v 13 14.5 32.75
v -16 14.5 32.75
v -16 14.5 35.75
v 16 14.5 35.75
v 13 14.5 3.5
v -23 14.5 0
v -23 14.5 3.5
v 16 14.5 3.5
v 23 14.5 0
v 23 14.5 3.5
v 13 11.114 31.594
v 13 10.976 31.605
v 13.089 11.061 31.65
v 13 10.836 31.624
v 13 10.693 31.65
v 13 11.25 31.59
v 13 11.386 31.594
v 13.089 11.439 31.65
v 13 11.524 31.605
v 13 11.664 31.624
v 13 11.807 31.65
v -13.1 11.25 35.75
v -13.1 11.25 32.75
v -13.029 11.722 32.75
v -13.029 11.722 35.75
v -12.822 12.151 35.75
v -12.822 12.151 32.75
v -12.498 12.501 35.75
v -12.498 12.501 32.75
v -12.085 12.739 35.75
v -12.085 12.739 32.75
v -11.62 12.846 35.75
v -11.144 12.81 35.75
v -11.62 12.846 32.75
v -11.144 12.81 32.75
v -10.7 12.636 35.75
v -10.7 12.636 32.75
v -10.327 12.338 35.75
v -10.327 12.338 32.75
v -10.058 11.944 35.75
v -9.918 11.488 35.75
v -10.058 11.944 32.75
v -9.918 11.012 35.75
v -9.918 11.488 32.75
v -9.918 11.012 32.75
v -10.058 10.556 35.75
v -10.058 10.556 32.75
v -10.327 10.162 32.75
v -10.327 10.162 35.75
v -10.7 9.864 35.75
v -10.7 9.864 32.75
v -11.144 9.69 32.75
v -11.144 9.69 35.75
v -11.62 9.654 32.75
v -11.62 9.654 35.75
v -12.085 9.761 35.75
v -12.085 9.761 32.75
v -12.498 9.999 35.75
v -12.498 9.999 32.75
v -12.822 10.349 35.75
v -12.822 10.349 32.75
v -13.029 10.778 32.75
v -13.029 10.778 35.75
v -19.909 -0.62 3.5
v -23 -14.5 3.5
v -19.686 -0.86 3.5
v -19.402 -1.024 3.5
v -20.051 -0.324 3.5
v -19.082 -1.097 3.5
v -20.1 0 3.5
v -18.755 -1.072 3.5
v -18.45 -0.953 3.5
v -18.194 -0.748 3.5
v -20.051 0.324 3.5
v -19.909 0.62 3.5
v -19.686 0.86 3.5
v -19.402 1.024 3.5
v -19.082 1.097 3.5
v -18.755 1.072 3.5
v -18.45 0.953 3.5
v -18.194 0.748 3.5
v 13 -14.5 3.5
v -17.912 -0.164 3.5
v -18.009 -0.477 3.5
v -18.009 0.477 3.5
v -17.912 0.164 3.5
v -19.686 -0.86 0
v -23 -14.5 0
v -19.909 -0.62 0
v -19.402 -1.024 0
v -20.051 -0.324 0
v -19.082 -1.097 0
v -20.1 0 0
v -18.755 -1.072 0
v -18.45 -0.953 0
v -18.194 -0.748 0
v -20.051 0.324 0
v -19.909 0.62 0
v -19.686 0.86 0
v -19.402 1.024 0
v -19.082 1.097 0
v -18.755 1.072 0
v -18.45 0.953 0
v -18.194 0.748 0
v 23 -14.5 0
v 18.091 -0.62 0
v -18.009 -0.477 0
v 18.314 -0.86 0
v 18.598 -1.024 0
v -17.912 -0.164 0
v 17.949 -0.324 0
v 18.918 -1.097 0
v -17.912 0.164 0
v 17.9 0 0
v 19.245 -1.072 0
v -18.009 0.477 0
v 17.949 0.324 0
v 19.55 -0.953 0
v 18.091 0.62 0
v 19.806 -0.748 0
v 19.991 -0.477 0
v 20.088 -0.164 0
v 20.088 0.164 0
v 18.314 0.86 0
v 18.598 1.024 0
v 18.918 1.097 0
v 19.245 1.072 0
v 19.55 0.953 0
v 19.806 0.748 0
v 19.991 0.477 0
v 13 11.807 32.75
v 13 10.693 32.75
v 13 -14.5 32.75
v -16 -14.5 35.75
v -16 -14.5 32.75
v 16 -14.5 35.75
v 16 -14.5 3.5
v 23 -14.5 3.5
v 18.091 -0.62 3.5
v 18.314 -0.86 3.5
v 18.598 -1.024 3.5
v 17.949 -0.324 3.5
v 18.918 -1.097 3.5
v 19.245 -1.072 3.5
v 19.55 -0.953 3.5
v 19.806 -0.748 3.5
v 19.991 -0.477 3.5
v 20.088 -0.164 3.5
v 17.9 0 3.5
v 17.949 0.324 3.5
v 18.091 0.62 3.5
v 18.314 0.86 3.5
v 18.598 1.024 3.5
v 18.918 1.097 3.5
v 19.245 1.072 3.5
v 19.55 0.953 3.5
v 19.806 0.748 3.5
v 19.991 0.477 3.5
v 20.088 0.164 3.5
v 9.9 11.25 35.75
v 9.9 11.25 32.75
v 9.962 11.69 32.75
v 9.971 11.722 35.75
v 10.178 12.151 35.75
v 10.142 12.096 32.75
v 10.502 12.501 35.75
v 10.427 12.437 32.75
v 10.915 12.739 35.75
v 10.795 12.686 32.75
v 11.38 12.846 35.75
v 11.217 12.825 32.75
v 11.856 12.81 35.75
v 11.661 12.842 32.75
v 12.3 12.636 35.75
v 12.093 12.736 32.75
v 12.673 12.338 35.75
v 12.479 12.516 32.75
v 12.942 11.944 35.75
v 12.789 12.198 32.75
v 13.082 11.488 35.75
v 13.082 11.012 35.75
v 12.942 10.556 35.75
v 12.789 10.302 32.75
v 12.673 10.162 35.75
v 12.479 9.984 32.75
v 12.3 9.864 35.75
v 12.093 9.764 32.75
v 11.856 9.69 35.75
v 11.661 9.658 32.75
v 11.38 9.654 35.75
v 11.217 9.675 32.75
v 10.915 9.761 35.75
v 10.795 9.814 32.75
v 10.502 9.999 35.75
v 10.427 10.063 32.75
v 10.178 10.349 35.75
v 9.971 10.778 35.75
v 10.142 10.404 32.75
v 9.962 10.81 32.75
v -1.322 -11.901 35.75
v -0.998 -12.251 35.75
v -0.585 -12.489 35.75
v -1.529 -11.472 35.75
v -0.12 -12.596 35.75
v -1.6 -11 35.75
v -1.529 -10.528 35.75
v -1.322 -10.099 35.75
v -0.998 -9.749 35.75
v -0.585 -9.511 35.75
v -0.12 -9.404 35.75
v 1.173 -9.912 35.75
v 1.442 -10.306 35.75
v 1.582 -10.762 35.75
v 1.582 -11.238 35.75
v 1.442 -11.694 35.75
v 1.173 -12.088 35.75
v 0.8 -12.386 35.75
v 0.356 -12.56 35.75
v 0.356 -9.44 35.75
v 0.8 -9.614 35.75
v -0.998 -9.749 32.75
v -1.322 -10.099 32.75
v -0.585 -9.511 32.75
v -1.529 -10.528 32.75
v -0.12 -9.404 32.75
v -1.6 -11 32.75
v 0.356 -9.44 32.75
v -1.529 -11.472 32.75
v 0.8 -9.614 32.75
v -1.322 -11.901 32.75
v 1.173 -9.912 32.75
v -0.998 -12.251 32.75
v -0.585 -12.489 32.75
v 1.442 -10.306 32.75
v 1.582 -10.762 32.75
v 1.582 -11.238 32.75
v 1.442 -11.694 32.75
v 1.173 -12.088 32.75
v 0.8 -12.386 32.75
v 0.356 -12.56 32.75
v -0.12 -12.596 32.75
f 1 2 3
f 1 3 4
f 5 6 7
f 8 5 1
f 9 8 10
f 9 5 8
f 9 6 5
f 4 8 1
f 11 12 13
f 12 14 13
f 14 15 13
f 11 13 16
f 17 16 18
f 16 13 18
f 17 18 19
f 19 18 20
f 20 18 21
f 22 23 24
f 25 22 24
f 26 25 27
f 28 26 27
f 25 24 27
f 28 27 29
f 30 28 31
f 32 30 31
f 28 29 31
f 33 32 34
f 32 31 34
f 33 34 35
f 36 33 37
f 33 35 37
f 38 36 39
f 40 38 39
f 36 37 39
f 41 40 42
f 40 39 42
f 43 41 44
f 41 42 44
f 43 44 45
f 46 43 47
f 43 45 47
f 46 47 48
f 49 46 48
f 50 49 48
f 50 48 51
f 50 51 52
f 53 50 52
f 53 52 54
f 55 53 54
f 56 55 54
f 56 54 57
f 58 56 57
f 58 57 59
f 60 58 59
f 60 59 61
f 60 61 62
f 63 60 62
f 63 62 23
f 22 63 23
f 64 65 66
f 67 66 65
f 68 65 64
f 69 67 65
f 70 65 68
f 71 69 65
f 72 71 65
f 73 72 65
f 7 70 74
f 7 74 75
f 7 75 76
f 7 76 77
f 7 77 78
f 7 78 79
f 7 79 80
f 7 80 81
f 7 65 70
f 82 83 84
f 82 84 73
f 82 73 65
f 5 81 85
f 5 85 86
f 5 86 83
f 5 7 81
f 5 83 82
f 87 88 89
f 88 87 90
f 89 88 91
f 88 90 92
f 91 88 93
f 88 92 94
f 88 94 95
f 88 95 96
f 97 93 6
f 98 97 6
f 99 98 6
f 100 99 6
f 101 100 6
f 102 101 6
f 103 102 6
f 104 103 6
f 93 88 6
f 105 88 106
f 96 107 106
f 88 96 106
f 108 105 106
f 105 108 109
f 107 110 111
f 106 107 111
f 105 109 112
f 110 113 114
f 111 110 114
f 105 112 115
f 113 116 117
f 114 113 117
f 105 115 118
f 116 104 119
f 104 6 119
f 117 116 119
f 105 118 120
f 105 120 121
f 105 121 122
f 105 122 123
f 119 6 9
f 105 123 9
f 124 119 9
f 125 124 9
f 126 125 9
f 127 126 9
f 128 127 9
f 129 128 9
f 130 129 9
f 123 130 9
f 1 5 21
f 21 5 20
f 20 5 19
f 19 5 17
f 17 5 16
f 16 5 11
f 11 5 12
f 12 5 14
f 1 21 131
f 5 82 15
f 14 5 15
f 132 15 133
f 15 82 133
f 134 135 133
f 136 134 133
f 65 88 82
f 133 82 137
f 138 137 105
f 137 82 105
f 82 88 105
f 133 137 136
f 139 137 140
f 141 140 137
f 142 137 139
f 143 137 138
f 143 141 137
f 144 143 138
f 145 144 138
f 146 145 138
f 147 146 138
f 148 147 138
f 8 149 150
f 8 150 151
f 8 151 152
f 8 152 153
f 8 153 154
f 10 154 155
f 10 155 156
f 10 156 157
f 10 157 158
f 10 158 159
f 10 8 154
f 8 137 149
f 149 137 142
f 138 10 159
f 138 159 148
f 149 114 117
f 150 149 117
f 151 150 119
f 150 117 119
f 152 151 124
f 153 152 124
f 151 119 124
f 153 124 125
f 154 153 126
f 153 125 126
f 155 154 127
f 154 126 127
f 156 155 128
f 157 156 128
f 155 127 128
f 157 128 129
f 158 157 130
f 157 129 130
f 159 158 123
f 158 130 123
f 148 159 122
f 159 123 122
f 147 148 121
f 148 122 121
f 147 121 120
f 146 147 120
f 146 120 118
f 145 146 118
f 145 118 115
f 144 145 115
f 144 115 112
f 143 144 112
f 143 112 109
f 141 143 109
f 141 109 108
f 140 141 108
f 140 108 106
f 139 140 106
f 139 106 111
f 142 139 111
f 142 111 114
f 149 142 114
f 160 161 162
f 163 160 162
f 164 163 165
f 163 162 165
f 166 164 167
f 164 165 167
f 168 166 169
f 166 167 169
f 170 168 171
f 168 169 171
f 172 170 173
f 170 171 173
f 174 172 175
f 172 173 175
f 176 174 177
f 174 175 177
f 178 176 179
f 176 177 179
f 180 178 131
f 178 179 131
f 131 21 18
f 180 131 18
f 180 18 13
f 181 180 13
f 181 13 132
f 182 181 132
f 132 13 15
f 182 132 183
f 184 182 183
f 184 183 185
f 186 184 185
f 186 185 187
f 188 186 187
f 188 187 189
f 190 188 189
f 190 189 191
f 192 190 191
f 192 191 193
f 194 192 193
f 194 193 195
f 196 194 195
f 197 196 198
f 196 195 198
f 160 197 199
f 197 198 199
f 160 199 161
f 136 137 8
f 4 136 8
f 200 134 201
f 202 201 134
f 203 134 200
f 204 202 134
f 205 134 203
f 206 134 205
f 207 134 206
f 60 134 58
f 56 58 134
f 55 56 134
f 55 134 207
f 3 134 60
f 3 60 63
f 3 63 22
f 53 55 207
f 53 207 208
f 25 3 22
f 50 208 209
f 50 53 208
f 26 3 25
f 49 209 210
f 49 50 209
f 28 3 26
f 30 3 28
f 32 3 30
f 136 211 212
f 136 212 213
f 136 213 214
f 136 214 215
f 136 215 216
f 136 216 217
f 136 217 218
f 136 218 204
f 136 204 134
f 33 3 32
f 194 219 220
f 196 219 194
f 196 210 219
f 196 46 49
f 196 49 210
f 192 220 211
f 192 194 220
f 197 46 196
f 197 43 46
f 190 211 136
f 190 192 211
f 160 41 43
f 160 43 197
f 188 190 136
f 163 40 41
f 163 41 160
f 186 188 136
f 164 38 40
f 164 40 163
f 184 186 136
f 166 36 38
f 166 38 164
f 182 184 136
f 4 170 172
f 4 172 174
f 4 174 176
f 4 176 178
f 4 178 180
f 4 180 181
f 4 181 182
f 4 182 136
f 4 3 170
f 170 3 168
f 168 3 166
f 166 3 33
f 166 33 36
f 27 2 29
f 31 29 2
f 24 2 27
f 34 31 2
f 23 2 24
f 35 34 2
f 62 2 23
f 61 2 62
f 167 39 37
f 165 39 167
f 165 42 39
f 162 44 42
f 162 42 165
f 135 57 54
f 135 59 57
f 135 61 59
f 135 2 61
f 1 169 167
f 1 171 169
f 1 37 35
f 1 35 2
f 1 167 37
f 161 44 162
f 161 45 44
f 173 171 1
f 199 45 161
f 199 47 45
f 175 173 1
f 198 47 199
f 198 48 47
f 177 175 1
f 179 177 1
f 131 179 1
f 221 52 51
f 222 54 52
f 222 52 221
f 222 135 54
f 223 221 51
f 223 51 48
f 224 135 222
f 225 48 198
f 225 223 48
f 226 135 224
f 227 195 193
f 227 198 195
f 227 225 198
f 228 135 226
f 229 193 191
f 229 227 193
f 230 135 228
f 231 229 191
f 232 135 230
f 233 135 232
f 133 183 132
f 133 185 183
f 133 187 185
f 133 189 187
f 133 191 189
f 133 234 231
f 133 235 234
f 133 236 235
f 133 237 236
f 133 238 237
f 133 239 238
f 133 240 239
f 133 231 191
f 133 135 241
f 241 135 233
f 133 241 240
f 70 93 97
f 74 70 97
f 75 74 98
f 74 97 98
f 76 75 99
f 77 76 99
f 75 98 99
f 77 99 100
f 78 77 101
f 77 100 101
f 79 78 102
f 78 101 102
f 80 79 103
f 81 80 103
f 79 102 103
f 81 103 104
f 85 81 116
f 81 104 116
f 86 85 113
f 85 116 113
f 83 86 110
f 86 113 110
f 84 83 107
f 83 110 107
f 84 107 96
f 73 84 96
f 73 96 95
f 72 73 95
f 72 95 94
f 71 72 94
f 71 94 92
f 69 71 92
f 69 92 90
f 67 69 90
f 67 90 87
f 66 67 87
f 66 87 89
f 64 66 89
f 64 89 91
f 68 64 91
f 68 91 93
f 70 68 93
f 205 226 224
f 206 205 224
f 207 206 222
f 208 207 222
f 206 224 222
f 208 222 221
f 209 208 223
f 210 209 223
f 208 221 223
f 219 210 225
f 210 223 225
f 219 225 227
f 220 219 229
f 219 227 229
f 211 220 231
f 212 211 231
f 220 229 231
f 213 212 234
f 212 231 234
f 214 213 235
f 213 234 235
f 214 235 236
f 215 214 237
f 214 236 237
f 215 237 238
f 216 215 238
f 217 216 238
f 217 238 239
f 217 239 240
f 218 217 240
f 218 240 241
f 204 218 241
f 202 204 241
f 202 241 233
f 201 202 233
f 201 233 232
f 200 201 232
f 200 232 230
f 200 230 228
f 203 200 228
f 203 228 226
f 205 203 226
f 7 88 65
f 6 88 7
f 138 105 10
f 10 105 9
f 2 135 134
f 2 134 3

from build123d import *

# Parameters (mm, degrees)
F0_W     = 46
F0_H     = 29
F1_DEPTH = 3.5
F2_W     = 32
F2_H     = 29
F3_DEPTH = 32.25
F4_W     = 29
F4_H     = 29.25
F5_DEPTH = 29
F7_D     = 3.2
F7_DEPTH = 4.1
F7_TIP   = 0.9613769904
F9_D     = 2.2


with BuildPart() as f1:
    # F0 (on Top) → F1 (new body)
    with BuildSketch(Plane.XY):
        Rectangle(F0_W, F0_H)
    extrude(amount=F1_DEPTH)

    # F2 (on face) → F3 (join)
    with BuildSketch(Plane.XY.offset(3.5)):
        Rectangle(F2_W, F2_H)
    extrude(amount=F3_DEPTH)

    # F4 (on face) → F5 (cut)
    with BuildSketch(Plane.XZ.offset(14.5)):
        with Locations((-1.5, 18.125)):
            Rectangle(F4_W, F4_H)
    extrude(amount=-F5_DEPTH, mode=Mode.SUBTRACT)

    # F7
    with Locations(Plane.XY.offset(35.75)):
        with Locations((-11.5, 11.25), (11.5, 11.25), (0, -11)):
            Hole(F7_D / 2, depth=F7_DEPTH)
            with Locations((0, 0, -(F7_DEPTH + F7_TIP / 2))):  # 118° drill point
                Cone(0, F7_D / 2, F7_TIP, mode=Mode.SUBTRACT)

    # F9 (through all)
    with Locations(Plane.XY.offset(3.5)):
        with Locations((-19, 0), (19, 0)):
            Hole(F9_D / 2)


solid = f1.part
